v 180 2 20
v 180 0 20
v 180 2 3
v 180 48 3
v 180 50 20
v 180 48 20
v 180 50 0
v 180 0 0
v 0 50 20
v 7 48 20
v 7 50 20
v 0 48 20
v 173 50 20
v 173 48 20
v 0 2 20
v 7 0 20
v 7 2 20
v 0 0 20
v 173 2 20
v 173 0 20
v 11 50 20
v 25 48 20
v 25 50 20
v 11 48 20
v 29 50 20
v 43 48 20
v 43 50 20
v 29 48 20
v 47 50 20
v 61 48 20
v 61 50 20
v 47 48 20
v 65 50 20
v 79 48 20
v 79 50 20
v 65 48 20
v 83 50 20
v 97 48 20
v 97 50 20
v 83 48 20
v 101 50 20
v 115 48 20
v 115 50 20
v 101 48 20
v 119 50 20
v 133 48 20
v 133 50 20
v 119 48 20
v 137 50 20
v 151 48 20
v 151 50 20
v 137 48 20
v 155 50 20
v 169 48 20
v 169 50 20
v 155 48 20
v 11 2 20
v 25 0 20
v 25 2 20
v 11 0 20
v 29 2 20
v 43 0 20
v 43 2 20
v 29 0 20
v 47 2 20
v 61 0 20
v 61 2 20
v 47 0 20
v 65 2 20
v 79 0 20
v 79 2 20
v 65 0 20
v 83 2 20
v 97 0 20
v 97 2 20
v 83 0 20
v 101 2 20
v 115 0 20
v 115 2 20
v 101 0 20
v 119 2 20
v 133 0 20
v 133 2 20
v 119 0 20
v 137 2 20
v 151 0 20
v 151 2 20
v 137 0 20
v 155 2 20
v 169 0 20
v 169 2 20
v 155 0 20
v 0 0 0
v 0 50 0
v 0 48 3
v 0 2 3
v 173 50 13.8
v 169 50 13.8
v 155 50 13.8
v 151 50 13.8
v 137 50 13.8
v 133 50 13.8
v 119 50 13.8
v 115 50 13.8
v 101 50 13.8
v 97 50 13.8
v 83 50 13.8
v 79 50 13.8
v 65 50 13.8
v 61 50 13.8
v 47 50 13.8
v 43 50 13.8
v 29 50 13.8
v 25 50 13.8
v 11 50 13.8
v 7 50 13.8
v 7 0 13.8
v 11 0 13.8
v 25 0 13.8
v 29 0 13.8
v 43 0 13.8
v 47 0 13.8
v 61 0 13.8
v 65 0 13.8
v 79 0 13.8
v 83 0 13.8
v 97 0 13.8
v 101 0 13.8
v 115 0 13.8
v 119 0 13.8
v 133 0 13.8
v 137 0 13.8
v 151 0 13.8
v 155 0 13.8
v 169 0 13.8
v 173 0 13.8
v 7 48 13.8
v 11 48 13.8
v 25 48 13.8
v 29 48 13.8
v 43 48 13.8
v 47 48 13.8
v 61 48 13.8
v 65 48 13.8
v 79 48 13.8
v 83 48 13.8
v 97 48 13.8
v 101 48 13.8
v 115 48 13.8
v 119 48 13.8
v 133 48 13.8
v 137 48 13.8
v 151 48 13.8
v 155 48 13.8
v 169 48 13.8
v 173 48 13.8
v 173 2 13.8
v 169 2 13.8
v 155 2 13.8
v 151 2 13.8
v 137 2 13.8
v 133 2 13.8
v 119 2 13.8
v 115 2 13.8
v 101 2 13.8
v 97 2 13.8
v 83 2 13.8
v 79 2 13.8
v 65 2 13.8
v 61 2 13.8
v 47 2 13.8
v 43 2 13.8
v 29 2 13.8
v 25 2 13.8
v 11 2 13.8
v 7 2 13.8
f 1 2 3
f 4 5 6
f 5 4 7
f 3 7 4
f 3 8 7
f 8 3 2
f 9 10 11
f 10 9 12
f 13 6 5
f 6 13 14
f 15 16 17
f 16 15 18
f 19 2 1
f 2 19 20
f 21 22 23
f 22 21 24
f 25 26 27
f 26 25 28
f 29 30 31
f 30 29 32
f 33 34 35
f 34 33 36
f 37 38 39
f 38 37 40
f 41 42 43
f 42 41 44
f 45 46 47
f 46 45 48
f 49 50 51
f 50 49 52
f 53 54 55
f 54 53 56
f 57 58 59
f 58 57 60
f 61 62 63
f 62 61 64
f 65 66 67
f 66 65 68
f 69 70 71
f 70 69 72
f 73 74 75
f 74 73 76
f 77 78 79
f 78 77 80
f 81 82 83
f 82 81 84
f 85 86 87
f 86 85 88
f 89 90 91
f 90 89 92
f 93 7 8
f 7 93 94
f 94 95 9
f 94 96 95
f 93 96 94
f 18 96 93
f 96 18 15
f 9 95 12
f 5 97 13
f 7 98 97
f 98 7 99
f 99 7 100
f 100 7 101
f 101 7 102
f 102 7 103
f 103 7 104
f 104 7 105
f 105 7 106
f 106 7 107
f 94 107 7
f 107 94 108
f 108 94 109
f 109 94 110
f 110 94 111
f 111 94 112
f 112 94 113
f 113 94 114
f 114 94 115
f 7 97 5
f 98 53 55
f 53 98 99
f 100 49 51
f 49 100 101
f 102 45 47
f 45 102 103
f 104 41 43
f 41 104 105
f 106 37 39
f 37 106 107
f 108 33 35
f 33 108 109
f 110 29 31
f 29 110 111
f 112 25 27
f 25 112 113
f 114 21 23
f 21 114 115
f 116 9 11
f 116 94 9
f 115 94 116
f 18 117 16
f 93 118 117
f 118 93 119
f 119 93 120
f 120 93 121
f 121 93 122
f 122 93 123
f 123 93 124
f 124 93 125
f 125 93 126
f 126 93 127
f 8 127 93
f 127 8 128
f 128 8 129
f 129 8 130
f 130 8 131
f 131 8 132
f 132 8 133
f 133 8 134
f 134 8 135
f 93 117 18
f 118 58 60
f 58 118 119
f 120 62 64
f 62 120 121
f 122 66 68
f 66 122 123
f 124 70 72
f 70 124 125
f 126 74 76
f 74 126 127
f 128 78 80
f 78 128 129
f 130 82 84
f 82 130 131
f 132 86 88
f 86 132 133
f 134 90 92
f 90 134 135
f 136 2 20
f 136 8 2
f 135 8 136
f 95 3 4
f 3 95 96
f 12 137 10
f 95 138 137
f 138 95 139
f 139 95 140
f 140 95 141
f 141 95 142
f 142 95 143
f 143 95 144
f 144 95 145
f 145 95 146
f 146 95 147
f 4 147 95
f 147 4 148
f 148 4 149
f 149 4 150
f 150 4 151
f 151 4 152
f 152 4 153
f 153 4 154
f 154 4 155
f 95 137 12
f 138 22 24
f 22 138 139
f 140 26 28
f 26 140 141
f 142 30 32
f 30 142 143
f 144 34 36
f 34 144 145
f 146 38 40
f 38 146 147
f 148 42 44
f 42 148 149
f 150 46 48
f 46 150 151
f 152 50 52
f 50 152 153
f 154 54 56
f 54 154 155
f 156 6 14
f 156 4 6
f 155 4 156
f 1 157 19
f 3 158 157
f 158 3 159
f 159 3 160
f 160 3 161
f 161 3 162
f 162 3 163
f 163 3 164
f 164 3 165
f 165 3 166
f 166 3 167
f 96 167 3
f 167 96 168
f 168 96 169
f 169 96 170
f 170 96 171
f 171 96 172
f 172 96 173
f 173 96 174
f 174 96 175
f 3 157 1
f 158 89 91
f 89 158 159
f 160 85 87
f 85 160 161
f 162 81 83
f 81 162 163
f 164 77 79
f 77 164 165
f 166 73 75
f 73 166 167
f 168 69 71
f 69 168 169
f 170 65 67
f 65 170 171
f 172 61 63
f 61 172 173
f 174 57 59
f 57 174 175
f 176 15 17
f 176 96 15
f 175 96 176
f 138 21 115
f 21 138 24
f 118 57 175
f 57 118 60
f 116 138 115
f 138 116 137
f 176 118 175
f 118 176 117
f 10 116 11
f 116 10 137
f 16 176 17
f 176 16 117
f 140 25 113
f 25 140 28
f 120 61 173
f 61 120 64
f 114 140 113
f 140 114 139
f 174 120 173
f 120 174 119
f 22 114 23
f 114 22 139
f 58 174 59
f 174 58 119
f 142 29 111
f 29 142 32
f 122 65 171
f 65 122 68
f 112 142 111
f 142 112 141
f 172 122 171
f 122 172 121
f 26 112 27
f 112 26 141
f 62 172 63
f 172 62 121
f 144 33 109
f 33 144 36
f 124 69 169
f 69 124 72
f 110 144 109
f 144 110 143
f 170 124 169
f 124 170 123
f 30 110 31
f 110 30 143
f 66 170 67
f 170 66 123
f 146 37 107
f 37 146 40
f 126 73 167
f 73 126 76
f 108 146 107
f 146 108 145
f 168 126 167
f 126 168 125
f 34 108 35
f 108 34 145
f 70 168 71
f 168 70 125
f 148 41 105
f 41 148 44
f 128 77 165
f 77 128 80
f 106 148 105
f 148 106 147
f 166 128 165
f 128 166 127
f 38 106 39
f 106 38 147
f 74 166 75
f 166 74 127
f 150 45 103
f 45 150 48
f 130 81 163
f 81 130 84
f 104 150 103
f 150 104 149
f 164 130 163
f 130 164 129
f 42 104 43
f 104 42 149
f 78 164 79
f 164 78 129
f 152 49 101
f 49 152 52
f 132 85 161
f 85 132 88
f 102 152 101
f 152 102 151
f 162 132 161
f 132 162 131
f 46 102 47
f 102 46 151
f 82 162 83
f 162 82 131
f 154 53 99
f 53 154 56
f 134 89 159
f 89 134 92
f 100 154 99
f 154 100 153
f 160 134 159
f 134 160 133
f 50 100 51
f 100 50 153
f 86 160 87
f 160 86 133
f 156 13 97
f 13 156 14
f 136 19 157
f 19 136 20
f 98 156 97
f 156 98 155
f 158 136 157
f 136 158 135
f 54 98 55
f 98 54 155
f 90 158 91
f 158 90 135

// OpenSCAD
$fn = 32;

// ----------------------------------------------------------------------
// Cable duct: 180 x 50 x 20 mm, 10 fingers
// ----------------------------------------------------------------------

// --- parameters (mm) ---
duct_len = 180;           // duct length, X
duct_w = 50;              // duct width, Y
duct_h = 20;              // duct height, Z
wall_t = 2;               // side wall thickness
floor_t = 3;              // floor thickness
slot_w = 4;               // finger slot width
slot_h = 10.8;            // finger slot height
fingers = 10;             // number of finger slots per side
pitch = 18;               // finger pitch

module shell() {
  difference() {
    cube([duct_len, duct_w, duct_h]);
    /* open top channel */
    translate([-wall_t - 1, wall_t, floor_t])
      cube([duct_len + 2 * wall_t + 2, duct_w - 2 * wall_t, duct_h + 1]);
  }
}

difference() {
  union() {
    shell();
  }
  /* finger slots cut through both side walls */
  for (i = [0 : fingers - 1]) translate([pitch / 2 + i * pitch - slot_w / 2, -1, floor_t + slot_h]) cube([slot_w, duct_w + 2, duct_h]);
}
